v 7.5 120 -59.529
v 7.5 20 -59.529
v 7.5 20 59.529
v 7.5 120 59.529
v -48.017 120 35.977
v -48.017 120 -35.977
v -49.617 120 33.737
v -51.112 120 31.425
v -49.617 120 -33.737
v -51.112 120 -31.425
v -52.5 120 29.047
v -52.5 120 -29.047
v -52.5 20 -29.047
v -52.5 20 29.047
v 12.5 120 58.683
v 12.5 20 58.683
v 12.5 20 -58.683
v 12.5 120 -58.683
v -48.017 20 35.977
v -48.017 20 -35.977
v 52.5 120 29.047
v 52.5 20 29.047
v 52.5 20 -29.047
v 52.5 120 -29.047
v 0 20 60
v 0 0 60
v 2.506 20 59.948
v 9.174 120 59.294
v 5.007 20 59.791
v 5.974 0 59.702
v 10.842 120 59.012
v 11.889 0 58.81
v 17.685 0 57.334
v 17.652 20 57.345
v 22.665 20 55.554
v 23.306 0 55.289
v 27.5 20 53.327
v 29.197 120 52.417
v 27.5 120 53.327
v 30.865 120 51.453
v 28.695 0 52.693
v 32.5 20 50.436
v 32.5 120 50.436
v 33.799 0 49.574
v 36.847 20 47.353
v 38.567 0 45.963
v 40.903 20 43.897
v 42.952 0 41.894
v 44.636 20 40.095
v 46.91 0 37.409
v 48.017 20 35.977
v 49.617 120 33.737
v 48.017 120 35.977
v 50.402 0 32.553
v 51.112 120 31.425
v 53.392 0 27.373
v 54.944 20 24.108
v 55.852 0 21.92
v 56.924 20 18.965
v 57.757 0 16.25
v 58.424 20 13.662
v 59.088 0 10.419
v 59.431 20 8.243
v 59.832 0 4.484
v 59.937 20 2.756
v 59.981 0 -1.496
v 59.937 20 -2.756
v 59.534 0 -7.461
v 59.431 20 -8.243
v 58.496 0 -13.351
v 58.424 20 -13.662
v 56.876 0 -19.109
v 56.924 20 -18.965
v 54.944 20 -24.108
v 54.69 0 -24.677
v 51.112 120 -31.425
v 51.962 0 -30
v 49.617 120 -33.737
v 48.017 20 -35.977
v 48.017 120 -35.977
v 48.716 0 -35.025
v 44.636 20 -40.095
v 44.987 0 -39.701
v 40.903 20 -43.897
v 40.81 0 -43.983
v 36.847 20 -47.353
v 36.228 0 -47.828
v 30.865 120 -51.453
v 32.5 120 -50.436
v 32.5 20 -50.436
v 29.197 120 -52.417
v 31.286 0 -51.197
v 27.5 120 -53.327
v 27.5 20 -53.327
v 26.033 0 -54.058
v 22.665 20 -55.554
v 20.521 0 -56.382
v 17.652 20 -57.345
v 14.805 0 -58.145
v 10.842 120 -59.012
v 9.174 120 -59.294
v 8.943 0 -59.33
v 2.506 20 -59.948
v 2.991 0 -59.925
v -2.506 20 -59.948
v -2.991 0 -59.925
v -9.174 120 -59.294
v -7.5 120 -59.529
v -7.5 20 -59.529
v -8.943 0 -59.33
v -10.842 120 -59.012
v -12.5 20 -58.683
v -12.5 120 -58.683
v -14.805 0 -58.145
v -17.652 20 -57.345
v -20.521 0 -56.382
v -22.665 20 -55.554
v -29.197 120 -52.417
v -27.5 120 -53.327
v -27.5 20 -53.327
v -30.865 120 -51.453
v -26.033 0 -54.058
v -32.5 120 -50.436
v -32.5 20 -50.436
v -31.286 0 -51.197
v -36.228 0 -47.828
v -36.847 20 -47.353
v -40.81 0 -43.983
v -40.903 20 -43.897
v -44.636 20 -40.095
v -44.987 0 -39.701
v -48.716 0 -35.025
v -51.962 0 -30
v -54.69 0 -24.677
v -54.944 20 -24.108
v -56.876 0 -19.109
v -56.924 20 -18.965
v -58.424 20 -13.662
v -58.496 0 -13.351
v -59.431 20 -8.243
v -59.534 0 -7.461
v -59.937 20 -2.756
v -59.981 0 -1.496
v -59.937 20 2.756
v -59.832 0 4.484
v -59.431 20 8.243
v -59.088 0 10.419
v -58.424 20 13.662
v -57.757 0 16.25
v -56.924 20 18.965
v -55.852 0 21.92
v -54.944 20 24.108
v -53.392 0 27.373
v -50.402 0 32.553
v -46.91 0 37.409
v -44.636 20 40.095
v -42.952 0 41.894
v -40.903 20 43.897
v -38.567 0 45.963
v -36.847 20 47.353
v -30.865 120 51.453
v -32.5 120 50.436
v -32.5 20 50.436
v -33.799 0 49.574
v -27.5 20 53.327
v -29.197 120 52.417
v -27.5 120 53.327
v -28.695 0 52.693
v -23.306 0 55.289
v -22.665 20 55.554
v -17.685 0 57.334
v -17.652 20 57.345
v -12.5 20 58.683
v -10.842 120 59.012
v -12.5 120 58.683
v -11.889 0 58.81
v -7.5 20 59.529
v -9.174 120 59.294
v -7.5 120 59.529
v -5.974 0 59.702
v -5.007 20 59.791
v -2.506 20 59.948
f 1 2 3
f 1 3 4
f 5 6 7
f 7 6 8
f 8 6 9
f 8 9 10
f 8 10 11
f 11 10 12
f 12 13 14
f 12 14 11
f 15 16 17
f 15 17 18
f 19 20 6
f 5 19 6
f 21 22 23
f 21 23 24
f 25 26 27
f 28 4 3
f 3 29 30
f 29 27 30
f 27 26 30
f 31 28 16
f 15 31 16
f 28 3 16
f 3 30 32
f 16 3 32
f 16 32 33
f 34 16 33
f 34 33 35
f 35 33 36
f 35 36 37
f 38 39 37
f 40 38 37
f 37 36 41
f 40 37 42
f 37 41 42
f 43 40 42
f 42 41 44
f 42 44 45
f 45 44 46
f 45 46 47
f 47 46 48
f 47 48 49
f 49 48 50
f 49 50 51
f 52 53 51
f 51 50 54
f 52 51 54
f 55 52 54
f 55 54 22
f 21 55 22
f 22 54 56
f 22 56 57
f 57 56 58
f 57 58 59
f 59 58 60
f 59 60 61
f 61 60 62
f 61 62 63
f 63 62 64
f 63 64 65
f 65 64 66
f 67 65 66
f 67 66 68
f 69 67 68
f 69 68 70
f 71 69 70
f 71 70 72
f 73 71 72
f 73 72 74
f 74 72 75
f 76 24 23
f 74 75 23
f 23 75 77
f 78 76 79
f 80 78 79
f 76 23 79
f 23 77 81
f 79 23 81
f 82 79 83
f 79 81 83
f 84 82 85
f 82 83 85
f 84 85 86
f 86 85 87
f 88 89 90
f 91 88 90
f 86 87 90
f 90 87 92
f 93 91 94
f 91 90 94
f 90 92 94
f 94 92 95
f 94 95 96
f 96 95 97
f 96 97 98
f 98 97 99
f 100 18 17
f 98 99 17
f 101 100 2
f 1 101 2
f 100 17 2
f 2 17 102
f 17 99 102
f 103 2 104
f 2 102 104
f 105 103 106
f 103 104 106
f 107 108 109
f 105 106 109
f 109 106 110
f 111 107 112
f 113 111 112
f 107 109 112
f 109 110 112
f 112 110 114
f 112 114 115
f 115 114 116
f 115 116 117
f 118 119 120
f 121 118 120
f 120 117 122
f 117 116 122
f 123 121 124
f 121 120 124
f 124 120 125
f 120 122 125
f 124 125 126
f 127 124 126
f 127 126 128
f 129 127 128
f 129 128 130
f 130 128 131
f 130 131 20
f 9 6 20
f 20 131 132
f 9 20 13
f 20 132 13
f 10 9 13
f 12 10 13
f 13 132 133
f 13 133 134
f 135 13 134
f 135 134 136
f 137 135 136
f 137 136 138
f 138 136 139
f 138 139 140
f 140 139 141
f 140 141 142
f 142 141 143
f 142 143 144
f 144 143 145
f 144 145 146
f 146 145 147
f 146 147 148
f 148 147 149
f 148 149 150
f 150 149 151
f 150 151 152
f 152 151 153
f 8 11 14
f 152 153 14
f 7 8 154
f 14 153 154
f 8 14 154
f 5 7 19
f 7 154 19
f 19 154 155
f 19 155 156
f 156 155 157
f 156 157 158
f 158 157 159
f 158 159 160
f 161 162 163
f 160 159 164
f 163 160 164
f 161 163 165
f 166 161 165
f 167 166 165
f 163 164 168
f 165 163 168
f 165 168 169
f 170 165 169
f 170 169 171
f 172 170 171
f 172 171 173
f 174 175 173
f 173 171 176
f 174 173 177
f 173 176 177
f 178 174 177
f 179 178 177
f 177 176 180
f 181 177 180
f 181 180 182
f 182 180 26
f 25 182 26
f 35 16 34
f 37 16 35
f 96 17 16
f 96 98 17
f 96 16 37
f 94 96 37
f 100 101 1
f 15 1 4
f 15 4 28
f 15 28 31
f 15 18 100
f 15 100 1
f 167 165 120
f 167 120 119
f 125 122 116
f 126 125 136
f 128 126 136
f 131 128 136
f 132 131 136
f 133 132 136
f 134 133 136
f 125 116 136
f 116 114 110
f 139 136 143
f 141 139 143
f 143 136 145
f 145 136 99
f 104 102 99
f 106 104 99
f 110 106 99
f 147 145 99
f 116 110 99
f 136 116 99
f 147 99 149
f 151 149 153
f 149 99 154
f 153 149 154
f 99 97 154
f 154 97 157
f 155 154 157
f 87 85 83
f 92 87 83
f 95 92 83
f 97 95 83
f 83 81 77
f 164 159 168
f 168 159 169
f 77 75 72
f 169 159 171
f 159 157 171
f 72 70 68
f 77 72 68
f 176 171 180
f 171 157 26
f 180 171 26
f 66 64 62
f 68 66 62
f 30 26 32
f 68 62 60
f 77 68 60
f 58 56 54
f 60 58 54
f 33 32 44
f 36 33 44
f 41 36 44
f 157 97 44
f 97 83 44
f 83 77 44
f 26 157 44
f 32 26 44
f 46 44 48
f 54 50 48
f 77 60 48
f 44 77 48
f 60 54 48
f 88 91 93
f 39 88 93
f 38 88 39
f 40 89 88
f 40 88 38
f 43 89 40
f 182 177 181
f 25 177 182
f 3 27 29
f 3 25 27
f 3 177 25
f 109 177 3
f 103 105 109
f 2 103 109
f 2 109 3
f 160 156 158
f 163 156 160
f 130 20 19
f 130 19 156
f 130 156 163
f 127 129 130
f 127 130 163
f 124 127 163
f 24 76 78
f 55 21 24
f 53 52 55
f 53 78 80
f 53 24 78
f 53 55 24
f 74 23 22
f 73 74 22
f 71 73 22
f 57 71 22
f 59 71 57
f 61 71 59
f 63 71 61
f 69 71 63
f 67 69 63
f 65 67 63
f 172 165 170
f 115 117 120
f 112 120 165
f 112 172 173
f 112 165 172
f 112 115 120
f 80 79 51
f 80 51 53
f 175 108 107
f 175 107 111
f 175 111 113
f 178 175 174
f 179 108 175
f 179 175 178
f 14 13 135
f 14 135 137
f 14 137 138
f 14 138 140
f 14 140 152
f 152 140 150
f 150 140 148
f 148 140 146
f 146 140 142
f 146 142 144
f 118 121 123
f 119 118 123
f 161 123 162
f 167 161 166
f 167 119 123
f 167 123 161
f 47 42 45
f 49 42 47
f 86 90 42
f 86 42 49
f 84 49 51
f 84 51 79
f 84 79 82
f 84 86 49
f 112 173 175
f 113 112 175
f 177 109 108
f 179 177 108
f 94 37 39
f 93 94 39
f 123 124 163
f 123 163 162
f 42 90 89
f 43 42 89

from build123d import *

# Parameters (mm, degrees)
SKETCH2_R           = 60
BOSS_EXTRUDE1_DEPTH = 120
SKETCH4_W           = 7.5
SKETCH4_H           = 100
SKETCH4_W_2         = 15.517169794
SKETCH4_W_3         = 15
CUT_EXTRUDE1_DEPTH  = 60


with BuildPart() as part:
    # Sketch2 → Boss-Extrude1 (new body)
    with BuildSketch(Plane(origin=(0, 0, 0), x_dir=(1, 0, 0), z_dir=(0, 1, 0))):
        with Locations(Location((0, 0, 0), (0, 0, 270))):
            Circle(SKETCH2_R)
    extrude(amount=BOSS_EXTRUDE1_DEPTH)

    # Sketch4 → Cut-Extrude1 (cut, symmetric)
    with BuildSketch(Plane.XY):
        with Locations((-56.25, 70)):
            Rectangle(SKETCH4_W, SKETCH4_H)
        with Locations((-40.258584897, 70)):
            Rectangle(SKETCH4_W_2, SKETCH4_H)
        with Locations((-20, 70)):
            Rectangle(SKETCH4_W_3, SKETCH4_H)
        with Locations((0, 70)):
            Rectangle(SKETCH4_W_3, SKETCH4_H)
        with Locations((20, 70)):
            Rectangle(SKETCH4_W_3, SKETCH4_H)
        with Locations((40.258584897, 70)):
            Rectangle(SKETCH4_W_2, SKETCH4_H)
        with Locations((56.25, 70)):
            Rectangle(SKETCH4_W, SKETCH4_H)
    extrude(amount=CUT_EXTRUDE1_DEPTH, both=True, mode=Mode.SUBTRACT)


solid = part.part
